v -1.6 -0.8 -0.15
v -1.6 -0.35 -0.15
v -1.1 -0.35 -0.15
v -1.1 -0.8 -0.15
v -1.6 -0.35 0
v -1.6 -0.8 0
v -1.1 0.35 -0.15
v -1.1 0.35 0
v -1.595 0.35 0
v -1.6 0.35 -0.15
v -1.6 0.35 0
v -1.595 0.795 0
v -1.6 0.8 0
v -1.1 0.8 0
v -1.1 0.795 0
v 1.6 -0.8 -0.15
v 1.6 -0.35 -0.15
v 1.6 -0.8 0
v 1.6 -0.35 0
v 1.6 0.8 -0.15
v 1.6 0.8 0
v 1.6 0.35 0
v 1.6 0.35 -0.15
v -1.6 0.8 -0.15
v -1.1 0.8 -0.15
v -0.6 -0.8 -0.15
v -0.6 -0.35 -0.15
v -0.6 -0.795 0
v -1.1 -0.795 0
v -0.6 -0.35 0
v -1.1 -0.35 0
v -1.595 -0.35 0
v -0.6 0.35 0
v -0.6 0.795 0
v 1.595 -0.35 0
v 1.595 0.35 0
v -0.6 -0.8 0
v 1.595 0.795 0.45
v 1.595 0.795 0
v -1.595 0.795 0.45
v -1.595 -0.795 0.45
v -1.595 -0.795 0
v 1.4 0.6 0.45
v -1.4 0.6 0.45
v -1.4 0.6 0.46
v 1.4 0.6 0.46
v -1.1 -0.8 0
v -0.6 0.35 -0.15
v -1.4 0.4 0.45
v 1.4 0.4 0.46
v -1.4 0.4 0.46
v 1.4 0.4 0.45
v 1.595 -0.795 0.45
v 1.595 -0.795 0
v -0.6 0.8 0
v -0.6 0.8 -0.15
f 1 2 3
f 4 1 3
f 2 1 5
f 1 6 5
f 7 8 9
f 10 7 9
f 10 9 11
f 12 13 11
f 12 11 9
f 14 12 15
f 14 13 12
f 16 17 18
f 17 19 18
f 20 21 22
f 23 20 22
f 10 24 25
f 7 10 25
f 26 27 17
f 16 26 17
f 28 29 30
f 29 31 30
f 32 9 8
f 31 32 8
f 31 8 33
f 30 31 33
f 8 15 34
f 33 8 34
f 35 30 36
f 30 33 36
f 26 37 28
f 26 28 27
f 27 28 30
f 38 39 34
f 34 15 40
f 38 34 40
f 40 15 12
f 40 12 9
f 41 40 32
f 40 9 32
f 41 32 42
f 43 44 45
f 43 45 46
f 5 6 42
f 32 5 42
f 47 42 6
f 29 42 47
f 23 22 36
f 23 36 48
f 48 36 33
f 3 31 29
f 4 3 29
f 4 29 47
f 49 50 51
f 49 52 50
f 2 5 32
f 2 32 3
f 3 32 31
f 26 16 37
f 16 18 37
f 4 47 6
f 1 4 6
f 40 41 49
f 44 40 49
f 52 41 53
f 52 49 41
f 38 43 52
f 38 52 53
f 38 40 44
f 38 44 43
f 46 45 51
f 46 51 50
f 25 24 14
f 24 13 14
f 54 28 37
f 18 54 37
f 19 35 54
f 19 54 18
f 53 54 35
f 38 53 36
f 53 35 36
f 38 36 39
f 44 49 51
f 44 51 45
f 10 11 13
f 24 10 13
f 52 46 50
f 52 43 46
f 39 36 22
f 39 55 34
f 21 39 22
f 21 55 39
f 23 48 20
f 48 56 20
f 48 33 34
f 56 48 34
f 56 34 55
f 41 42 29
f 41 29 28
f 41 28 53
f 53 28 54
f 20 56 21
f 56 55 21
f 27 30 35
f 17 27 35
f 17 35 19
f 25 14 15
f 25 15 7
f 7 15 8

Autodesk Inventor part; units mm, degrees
ref_plane "YZ Plane" through (0, 0, 0) normal (1, 0, 0) x (0, 1, 0)
ref_plane "XZ Plane" through (0, 0, 0) normal (0, 1, 0) x (-1, 0, 0)
ref_plane "XY Plane" through (0, 0, 0) normal (0, 0, 1) x (1, 0, 0)
sketch "Sketch1" plane through (0, 0, 0) normal (0, 0, 1) x (1, 0, 0)
  line L0 (-1.6, 0.8) -> (-1.1, 0.8)
  line L1 (-1.1, 0.8) -> (-1.1, 0.35)
  line L2 (-1.1, 0.35) -> (-1.6, 0.35)
  line L3 (-1.6, 0.35) -> (-1.6, 0.8)
  line L4 (-1.6, -0.35) -> (-1.1, -0.35)
  line L5 (-1.1, -0.35) -> (-1.1, -0.8)
  line L6 (-1.1, -0.8) -> (-1.6, -0.8)
  line L7 (-1.6, -0.8) -> (-1.6, -0.35)
  line L8 (-0.6, 0.8) -> (1.6, 0.8)
  line L9 (1.6, 0.8) -> (1.6, 0.35)
  line L10 (1.6, 0.35) -> (-0.6, 0.35)
  line L11 (-0.6, 0.35) -> (-0.6, 0.8)
  line L12 (-0.6, -0.35) -> (1.6, -0.35)
  line L13 (1.6, -0.35) -> (1.6, -0.8)
  line L14 (1.6, -0.8) -> (-0.6, -0.8)
  line L15 (-0.6, -0.8) -> (-0.6, -0.35)
  line L16 (-1.6, 0.8) -> (1.6, 0.8)
  line L17 (1.6, 0.8) -> (1.6, -0.8)
  line L18 (1.6, -0.8) -> (-1.6, -0.8)
  line L19 (-1.6, -0.8) -> (-1.6, 0.8)
  line L20 (1.595, 0.795) -> (-1.595, 0.795)
  line L21 (-1.595, 0.795) -> (-1.595, -0.795)
  line L22 (-1.595, -0.795) -> (1.595, -0.795)
  line L23 (1.595, -0.795) -> (1.595, 0.795)
  point P0 (0, 0)
  point P1 (0, 0.8)
  point P2 (-1.6, 0)
  dimension "d0" = 2.2
  dimension "d1" = 0.45
  dimension "d2" = 0.7
  dimension "d3" = 0.5
  dimension "d4" = 0.5
  dimension "d7" = 0.005
extrude "Extrusion1" add sketch "Sketch1" against normal blind 0.15 contours L0 L1 L20 L21 L2 L3 | L1 L2 L21 L20 | L8 L9 L10 L23 L20 L11 | L4 L21 L22 L5 L6 L7 | L20 L23 L10 L11 | L4 L5 L22 L21 | L13 L14 L15 L22 L23 L12 | L23 L22 L15 L12
extrude "Extrusion2" add sketch "Sketch1" along normal blind 0.45 contours L20 L11 L10 L23 L12 L15 L22 L5 L4 L21 L2 L1 | L1 L2 L21 L20 | L20 L23 L10 L11 | L4 L5 L22 L21 | L23 L22 L15 L12
sketch "Sketch2" plane through (0, 0, 0.45) normal (0, 0, 1) x (1, 0, 0)
  line L0 (1.595, 0.795) -> (-1.595, 0.795) projected
  line L1 (-1.595, 0.795) -> (-1.595, -0.795) projected
  line L2 (-1.595, -0.795) -> (1.595, -0.795) projected
  line L3 (1.595, -0.795) -> (1.595, 0.795) projected
  line L4 (-1.4, 0.6) -> (1.4, 0.6)
  line L5 (1.4, 0.6) -> (1.4, 0.4)
  line L6 (1.4, 0.4) -> (-1.4, 0.4)
  line L7 (-1.4, 0.4) -> (-1.4, 0.6)
  point P0 (0, 0)
  point P1 (0, 0.4)
  dimension "d10" = 2.8
  dimension "d11" = 0.2
  dimension "d12" = 0.4
extrude "Extrusion3" add sketch "Sketch2" along normal blind 0.01 contours L4 L5 L6 L7
properties part number "23-5m00" material "Copper"
